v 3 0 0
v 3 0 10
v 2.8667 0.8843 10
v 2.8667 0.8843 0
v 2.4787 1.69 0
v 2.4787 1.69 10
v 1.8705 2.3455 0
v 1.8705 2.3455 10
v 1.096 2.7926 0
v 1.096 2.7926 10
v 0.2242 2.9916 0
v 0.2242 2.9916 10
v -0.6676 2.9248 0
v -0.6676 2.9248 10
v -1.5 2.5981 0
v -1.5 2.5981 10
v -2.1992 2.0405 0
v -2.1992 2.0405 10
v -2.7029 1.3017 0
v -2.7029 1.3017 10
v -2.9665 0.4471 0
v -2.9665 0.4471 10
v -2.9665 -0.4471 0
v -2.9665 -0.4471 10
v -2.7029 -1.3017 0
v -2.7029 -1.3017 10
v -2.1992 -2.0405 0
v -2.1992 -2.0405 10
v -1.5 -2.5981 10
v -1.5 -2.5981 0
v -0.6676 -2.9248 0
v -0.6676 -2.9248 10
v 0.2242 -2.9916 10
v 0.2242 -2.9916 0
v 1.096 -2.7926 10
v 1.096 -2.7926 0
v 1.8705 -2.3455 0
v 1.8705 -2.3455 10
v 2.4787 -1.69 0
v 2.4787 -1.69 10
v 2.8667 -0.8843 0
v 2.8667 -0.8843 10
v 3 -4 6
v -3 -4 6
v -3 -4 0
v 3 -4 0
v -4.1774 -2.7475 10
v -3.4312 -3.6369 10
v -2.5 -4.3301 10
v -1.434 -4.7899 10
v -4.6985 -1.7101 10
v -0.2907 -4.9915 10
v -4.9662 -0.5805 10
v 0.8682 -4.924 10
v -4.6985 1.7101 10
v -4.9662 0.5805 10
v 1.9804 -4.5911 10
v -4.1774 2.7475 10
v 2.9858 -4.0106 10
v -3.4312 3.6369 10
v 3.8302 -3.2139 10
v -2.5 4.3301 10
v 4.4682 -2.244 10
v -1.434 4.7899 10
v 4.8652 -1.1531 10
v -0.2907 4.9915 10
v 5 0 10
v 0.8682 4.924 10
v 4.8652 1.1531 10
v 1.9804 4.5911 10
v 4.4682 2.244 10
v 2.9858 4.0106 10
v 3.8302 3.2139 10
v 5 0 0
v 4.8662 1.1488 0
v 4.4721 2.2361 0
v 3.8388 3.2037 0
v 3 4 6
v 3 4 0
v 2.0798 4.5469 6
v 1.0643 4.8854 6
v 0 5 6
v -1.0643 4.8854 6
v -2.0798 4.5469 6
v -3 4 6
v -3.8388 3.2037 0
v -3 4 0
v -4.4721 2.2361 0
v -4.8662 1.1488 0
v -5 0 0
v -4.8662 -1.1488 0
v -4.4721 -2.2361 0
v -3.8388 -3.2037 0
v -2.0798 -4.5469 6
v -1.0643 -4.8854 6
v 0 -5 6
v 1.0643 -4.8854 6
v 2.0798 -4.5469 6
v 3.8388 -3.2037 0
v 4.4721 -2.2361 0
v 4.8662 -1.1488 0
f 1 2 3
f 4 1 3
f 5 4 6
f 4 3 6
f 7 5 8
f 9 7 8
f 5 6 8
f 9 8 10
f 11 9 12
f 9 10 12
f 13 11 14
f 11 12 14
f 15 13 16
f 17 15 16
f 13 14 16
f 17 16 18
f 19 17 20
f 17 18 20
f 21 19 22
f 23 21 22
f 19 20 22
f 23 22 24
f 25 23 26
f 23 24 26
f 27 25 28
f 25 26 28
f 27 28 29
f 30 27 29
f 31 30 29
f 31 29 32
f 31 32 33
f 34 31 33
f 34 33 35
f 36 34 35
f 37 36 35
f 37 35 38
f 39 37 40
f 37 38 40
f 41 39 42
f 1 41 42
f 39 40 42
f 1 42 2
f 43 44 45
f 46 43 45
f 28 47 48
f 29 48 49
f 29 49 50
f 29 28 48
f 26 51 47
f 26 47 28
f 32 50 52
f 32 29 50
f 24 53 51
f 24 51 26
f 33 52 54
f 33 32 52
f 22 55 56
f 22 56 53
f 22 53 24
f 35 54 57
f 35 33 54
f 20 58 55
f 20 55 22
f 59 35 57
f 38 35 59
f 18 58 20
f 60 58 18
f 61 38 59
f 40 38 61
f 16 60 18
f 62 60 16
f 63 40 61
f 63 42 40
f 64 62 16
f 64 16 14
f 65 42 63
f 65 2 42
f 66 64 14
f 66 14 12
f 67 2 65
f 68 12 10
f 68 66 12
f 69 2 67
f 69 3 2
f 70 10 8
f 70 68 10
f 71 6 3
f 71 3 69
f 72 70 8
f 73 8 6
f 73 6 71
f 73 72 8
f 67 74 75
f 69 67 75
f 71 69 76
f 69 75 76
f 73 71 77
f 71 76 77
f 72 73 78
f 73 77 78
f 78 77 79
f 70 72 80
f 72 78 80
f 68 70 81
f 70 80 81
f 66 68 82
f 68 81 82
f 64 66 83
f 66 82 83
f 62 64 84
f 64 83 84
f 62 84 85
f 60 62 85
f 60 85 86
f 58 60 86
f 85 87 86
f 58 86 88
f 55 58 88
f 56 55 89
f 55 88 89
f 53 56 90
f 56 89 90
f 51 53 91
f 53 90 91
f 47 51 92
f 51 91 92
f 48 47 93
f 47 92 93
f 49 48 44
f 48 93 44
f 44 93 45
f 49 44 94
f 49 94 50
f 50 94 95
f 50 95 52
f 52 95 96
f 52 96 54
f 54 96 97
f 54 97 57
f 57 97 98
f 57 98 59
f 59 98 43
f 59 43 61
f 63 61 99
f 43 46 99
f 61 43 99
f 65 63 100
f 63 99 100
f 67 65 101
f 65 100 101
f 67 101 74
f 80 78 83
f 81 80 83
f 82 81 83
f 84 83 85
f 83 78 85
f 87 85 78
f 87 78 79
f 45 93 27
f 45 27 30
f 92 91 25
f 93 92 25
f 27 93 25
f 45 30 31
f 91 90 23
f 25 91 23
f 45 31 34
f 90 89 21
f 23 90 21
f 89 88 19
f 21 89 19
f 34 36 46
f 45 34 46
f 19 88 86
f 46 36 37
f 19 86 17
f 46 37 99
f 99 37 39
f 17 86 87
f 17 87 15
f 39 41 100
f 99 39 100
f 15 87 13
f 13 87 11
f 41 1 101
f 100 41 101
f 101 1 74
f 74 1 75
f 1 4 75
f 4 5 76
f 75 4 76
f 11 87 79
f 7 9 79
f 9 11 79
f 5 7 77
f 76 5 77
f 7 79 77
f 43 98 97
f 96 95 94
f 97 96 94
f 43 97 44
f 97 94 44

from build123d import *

# Parameters (mm, degrees)
ESQUISSE1_R                  = 5
BOSS_EXTRU_1_DEPTH           = 10
ESQUISSE2_R                  = 3
ENL_V_MAT_EXTRU_1_DEPTH      = 10
ENL_V_MAT_EXTRU_2_DEPTH      = 10
ENL_V_MAT_EXTRU_2_DEPTH_BACK = 10
ESQUISSE3_W                  = 6
ESQUISSE3_H                  = 1


with BuildPart() as part:
    # Esquisse1 → Boss.-Extru.1 (new body)
    with BuildSketch(Plane.XY):
        Circle(ESQUISSE1_R)
    extrude(amount=BOSS_EXTRU_1_DEPTH)

    # Esquisse2 → Enlèv. mat.-Extru.1 (cut)
    with BuildSketch(Plane.XY.offset(10)):
        Circle(ESQUISSE2_R)
    extrude(amount=-ENL_V_MAT_EXTRU_1_DEPTH, mode=Mode.SUBTRACT)

    # Esquisse3 → Enlèv. mat.-Extru.2 (cut, two sides: drawn at the far end of the back side and taken through both)
    with BuildSketch(Plane(origin=(0, 0, 0), x_dir=(0, 0, -1), z_dir=(1, 0, 0)).offset(-ENL_V_MAT_EXTRU_2_DEPTH_BACK)):
        with Locations((-3, 4.5)):
            Rectangle(ESQUISSE3_W, ESQUISSE3_H)
        with Locations((-3, -4.5)):
            Rectangle(ESQUISSE3_W, ESQUISSE3_H)
    extrude(amount=ENL_V_MAT_EXTRU_2_DEPTH + ENL_V_MAT_EXTRU_2_DEPTH_BACK, mode=Mode.SUBTRACT)


solid = part.part
